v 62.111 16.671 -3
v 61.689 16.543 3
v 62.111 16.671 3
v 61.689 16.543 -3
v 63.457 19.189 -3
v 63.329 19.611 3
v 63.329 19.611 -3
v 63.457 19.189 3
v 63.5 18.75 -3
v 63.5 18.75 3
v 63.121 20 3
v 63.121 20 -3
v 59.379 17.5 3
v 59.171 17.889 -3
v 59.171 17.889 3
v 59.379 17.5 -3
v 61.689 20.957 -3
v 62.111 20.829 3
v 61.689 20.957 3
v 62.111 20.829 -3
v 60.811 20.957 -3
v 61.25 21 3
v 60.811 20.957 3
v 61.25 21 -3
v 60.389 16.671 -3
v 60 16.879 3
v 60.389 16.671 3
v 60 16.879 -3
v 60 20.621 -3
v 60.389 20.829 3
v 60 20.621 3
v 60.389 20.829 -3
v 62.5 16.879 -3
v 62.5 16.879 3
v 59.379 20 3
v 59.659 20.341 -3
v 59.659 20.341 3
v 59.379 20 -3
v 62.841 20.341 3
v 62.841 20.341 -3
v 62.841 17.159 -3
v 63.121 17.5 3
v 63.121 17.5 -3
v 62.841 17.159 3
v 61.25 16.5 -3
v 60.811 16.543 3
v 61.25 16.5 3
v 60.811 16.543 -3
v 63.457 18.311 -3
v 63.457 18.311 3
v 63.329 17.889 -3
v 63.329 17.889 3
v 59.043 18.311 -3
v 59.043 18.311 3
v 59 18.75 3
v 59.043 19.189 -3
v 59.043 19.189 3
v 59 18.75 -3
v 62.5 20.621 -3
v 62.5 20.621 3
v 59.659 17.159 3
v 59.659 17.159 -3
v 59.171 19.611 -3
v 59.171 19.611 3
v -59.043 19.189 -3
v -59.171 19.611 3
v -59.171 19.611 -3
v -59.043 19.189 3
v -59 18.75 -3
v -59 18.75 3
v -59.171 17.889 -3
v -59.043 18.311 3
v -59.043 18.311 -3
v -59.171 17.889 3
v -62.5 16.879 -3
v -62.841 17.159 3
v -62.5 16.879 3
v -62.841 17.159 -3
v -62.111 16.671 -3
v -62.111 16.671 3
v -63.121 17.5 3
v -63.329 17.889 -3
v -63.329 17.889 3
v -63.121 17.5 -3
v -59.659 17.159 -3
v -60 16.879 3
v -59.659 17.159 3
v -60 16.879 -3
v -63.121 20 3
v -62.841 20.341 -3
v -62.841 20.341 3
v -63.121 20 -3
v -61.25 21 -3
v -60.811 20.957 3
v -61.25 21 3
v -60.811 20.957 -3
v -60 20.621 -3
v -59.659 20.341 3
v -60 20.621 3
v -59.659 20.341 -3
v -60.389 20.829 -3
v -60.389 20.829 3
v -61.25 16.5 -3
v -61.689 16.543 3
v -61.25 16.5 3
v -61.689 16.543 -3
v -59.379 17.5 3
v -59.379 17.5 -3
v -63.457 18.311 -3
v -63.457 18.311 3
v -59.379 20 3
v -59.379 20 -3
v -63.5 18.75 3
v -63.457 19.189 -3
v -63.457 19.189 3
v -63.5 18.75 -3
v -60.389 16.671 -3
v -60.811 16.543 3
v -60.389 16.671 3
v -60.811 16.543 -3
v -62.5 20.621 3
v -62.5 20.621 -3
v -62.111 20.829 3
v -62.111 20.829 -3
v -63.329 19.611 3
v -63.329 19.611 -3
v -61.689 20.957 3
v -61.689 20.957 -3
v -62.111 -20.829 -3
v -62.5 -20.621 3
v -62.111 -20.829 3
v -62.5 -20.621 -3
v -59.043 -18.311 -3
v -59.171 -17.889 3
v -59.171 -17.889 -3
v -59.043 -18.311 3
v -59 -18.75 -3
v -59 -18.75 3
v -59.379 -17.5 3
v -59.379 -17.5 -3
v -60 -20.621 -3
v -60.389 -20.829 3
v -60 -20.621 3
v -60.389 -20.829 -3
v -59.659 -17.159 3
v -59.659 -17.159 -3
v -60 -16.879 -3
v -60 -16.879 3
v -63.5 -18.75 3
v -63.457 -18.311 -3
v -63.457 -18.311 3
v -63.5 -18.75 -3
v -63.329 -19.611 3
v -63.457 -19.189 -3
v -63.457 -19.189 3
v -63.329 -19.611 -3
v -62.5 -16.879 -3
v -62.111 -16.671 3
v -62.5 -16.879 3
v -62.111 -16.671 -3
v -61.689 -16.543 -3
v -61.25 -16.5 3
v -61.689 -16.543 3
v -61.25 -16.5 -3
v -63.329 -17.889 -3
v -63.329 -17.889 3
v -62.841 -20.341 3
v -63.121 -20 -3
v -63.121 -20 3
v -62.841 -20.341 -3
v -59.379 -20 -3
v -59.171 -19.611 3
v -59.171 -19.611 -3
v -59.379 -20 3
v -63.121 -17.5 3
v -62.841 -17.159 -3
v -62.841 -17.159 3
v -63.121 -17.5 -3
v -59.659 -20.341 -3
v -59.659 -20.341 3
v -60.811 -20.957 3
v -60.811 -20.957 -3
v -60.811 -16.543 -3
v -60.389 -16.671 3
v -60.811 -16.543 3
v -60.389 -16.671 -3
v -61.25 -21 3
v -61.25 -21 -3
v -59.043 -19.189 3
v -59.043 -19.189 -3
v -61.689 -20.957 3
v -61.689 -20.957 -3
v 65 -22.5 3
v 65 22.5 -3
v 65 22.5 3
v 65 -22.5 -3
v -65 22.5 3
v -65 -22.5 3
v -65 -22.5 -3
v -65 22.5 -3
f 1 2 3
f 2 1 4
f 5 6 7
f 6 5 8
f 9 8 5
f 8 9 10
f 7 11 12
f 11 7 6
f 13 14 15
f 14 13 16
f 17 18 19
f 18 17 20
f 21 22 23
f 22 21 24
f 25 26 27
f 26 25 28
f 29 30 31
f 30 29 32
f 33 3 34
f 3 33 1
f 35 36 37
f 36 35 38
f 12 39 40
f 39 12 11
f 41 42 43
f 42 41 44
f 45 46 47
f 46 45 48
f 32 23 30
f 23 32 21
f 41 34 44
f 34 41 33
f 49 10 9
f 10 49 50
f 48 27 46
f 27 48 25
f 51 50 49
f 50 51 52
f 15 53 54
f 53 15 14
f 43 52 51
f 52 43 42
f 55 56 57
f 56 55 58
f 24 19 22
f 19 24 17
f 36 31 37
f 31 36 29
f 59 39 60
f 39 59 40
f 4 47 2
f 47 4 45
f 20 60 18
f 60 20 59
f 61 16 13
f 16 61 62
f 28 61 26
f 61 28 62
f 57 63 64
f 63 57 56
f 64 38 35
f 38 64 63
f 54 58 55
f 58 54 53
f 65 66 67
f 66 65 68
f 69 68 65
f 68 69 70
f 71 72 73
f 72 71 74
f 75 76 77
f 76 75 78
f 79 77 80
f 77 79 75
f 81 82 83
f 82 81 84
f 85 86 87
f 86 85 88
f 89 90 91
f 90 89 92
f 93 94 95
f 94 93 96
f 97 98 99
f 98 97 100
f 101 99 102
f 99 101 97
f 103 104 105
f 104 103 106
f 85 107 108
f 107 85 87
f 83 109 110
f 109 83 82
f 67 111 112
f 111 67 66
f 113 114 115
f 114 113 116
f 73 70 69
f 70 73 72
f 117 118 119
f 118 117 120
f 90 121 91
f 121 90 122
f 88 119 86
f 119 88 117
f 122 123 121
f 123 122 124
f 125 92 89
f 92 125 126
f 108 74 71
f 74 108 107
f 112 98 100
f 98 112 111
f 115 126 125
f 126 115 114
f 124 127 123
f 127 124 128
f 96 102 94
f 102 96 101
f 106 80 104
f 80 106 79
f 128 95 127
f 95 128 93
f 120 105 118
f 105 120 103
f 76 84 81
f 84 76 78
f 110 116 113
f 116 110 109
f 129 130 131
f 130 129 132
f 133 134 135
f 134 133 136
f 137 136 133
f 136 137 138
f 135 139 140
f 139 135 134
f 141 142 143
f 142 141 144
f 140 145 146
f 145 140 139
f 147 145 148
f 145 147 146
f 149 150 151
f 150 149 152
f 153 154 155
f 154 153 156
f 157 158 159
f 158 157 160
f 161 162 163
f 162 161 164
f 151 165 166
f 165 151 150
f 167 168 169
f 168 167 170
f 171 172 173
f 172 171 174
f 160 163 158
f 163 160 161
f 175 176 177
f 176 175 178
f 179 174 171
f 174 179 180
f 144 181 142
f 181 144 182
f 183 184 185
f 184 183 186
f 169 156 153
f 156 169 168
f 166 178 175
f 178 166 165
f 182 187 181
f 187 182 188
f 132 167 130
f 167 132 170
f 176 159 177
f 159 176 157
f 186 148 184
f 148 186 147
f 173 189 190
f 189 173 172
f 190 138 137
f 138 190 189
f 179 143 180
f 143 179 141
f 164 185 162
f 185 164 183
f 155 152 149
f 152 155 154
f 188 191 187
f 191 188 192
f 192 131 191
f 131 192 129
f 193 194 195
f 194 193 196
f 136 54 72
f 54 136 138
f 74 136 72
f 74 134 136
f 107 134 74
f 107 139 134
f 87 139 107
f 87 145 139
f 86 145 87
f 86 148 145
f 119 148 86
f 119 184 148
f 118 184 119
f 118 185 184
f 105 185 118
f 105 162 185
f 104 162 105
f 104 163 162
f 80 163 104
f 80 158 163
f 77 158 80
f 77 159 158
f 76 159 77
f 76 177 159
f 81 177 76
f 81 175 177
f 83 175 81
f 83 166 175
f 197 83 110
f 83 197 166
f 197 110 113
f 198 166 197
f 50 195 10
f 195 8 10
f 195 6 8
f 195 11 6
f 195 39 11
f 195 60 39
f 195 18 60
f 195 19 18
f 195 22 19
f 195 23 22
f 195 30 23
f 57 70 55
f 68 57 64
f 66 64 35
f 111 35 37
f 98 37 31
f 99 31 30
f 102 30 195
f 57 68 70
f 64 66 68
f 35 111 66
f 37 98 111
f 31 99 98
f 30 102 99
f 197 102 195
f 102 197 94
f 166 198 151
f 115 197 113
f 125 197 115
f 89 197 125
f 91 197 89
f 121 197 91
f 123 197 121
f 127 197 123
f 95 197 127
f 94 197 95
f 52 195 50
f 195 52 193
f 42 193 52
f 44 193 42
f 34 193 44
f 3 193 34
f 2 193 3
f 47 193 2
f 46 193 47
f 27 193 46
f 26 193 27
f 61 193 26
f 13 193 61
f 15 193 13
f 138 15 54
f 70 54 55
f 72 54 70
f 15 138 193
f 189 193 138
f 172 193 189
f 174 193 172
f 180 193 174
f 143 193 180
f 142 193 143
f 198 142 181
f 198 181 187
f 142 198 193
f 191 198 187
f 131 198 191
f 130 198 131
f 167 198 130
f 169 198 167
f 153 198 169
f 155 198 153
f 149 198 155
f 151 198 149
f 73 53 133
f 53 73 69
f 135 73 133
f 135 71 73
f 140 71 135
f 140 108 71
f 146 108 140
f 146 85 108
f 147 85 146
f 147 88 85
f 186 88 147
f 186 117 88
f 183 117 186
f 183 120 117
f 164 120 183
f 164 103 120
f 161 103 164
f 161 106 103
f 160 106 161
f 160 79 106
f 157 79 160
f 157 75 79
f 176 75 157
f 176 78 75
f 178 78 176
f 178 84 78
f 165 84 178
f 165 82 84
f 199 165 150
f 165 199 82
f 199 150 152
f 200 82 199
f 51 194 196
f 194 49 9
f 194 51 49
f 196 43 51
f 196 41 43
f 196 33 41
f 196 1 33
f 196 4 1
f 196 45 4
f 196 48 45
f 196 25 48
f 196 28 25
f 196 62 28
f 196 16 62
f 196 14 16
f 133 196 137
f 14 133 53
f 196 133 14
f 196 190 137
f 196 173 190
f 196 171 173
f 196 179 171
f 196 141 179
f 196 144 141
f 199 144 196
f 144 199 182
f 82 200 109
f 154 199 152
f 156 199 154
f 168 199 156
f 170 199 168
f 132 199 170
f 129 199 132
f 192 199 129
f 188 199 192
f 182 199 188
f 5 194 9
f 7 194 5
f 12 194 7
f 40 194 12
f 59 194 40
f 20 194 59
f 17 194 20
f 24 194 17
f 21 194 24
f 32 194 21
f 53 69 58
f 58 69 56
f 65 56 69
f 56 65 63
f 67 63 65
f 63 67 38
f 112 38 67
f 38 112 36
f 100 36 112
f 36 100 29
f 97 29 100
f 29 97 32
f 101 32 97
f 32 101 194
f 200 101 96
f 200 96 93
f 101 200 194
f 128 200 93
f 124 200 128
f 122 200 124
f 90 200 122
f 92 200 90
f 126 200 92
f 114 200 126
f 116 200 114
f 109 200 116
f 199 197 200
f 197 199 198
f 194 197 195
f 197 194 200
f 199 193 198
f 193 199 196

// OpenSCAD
$fn = 32;

// ----------------------------------------------------------------------
// Corner plate 130 x 45 x 6
// 3 holes, centres taken from the edge offset
// ----------------------------------------------------------------------

// --- parameters (mm) ---
plate = [130, 45, 6];  // overall size (x, y, z)
holes = 3;             // number of holes the drawing asks for
hole_d = 4.5;          // hole diameter
edge = 3.75;           // hole centre offset from the plate edge

// --- derived feature positions (mm) ---
corner_x = plate[0] / 2 - edge;  // = 61.25   corner hole X
corner_y = plate[1] / 2 - edge;  // = 18.75   corner hole Y
feature_centers = [
  [corner_x, corner_y],
  [-corner_x, corner_y],
  [-corner_x, -corner_y]
];   // hole centres the loop below drills

// plate outline, every hole drilled through with the same cutters
difference() {
  cube(plate, center = true);
  for (centre = feature_centers)
    translate([centre[0], centre[1], 0])
      cylinder(d = hole_d, h = plate[2] + 2, center = true);
}
